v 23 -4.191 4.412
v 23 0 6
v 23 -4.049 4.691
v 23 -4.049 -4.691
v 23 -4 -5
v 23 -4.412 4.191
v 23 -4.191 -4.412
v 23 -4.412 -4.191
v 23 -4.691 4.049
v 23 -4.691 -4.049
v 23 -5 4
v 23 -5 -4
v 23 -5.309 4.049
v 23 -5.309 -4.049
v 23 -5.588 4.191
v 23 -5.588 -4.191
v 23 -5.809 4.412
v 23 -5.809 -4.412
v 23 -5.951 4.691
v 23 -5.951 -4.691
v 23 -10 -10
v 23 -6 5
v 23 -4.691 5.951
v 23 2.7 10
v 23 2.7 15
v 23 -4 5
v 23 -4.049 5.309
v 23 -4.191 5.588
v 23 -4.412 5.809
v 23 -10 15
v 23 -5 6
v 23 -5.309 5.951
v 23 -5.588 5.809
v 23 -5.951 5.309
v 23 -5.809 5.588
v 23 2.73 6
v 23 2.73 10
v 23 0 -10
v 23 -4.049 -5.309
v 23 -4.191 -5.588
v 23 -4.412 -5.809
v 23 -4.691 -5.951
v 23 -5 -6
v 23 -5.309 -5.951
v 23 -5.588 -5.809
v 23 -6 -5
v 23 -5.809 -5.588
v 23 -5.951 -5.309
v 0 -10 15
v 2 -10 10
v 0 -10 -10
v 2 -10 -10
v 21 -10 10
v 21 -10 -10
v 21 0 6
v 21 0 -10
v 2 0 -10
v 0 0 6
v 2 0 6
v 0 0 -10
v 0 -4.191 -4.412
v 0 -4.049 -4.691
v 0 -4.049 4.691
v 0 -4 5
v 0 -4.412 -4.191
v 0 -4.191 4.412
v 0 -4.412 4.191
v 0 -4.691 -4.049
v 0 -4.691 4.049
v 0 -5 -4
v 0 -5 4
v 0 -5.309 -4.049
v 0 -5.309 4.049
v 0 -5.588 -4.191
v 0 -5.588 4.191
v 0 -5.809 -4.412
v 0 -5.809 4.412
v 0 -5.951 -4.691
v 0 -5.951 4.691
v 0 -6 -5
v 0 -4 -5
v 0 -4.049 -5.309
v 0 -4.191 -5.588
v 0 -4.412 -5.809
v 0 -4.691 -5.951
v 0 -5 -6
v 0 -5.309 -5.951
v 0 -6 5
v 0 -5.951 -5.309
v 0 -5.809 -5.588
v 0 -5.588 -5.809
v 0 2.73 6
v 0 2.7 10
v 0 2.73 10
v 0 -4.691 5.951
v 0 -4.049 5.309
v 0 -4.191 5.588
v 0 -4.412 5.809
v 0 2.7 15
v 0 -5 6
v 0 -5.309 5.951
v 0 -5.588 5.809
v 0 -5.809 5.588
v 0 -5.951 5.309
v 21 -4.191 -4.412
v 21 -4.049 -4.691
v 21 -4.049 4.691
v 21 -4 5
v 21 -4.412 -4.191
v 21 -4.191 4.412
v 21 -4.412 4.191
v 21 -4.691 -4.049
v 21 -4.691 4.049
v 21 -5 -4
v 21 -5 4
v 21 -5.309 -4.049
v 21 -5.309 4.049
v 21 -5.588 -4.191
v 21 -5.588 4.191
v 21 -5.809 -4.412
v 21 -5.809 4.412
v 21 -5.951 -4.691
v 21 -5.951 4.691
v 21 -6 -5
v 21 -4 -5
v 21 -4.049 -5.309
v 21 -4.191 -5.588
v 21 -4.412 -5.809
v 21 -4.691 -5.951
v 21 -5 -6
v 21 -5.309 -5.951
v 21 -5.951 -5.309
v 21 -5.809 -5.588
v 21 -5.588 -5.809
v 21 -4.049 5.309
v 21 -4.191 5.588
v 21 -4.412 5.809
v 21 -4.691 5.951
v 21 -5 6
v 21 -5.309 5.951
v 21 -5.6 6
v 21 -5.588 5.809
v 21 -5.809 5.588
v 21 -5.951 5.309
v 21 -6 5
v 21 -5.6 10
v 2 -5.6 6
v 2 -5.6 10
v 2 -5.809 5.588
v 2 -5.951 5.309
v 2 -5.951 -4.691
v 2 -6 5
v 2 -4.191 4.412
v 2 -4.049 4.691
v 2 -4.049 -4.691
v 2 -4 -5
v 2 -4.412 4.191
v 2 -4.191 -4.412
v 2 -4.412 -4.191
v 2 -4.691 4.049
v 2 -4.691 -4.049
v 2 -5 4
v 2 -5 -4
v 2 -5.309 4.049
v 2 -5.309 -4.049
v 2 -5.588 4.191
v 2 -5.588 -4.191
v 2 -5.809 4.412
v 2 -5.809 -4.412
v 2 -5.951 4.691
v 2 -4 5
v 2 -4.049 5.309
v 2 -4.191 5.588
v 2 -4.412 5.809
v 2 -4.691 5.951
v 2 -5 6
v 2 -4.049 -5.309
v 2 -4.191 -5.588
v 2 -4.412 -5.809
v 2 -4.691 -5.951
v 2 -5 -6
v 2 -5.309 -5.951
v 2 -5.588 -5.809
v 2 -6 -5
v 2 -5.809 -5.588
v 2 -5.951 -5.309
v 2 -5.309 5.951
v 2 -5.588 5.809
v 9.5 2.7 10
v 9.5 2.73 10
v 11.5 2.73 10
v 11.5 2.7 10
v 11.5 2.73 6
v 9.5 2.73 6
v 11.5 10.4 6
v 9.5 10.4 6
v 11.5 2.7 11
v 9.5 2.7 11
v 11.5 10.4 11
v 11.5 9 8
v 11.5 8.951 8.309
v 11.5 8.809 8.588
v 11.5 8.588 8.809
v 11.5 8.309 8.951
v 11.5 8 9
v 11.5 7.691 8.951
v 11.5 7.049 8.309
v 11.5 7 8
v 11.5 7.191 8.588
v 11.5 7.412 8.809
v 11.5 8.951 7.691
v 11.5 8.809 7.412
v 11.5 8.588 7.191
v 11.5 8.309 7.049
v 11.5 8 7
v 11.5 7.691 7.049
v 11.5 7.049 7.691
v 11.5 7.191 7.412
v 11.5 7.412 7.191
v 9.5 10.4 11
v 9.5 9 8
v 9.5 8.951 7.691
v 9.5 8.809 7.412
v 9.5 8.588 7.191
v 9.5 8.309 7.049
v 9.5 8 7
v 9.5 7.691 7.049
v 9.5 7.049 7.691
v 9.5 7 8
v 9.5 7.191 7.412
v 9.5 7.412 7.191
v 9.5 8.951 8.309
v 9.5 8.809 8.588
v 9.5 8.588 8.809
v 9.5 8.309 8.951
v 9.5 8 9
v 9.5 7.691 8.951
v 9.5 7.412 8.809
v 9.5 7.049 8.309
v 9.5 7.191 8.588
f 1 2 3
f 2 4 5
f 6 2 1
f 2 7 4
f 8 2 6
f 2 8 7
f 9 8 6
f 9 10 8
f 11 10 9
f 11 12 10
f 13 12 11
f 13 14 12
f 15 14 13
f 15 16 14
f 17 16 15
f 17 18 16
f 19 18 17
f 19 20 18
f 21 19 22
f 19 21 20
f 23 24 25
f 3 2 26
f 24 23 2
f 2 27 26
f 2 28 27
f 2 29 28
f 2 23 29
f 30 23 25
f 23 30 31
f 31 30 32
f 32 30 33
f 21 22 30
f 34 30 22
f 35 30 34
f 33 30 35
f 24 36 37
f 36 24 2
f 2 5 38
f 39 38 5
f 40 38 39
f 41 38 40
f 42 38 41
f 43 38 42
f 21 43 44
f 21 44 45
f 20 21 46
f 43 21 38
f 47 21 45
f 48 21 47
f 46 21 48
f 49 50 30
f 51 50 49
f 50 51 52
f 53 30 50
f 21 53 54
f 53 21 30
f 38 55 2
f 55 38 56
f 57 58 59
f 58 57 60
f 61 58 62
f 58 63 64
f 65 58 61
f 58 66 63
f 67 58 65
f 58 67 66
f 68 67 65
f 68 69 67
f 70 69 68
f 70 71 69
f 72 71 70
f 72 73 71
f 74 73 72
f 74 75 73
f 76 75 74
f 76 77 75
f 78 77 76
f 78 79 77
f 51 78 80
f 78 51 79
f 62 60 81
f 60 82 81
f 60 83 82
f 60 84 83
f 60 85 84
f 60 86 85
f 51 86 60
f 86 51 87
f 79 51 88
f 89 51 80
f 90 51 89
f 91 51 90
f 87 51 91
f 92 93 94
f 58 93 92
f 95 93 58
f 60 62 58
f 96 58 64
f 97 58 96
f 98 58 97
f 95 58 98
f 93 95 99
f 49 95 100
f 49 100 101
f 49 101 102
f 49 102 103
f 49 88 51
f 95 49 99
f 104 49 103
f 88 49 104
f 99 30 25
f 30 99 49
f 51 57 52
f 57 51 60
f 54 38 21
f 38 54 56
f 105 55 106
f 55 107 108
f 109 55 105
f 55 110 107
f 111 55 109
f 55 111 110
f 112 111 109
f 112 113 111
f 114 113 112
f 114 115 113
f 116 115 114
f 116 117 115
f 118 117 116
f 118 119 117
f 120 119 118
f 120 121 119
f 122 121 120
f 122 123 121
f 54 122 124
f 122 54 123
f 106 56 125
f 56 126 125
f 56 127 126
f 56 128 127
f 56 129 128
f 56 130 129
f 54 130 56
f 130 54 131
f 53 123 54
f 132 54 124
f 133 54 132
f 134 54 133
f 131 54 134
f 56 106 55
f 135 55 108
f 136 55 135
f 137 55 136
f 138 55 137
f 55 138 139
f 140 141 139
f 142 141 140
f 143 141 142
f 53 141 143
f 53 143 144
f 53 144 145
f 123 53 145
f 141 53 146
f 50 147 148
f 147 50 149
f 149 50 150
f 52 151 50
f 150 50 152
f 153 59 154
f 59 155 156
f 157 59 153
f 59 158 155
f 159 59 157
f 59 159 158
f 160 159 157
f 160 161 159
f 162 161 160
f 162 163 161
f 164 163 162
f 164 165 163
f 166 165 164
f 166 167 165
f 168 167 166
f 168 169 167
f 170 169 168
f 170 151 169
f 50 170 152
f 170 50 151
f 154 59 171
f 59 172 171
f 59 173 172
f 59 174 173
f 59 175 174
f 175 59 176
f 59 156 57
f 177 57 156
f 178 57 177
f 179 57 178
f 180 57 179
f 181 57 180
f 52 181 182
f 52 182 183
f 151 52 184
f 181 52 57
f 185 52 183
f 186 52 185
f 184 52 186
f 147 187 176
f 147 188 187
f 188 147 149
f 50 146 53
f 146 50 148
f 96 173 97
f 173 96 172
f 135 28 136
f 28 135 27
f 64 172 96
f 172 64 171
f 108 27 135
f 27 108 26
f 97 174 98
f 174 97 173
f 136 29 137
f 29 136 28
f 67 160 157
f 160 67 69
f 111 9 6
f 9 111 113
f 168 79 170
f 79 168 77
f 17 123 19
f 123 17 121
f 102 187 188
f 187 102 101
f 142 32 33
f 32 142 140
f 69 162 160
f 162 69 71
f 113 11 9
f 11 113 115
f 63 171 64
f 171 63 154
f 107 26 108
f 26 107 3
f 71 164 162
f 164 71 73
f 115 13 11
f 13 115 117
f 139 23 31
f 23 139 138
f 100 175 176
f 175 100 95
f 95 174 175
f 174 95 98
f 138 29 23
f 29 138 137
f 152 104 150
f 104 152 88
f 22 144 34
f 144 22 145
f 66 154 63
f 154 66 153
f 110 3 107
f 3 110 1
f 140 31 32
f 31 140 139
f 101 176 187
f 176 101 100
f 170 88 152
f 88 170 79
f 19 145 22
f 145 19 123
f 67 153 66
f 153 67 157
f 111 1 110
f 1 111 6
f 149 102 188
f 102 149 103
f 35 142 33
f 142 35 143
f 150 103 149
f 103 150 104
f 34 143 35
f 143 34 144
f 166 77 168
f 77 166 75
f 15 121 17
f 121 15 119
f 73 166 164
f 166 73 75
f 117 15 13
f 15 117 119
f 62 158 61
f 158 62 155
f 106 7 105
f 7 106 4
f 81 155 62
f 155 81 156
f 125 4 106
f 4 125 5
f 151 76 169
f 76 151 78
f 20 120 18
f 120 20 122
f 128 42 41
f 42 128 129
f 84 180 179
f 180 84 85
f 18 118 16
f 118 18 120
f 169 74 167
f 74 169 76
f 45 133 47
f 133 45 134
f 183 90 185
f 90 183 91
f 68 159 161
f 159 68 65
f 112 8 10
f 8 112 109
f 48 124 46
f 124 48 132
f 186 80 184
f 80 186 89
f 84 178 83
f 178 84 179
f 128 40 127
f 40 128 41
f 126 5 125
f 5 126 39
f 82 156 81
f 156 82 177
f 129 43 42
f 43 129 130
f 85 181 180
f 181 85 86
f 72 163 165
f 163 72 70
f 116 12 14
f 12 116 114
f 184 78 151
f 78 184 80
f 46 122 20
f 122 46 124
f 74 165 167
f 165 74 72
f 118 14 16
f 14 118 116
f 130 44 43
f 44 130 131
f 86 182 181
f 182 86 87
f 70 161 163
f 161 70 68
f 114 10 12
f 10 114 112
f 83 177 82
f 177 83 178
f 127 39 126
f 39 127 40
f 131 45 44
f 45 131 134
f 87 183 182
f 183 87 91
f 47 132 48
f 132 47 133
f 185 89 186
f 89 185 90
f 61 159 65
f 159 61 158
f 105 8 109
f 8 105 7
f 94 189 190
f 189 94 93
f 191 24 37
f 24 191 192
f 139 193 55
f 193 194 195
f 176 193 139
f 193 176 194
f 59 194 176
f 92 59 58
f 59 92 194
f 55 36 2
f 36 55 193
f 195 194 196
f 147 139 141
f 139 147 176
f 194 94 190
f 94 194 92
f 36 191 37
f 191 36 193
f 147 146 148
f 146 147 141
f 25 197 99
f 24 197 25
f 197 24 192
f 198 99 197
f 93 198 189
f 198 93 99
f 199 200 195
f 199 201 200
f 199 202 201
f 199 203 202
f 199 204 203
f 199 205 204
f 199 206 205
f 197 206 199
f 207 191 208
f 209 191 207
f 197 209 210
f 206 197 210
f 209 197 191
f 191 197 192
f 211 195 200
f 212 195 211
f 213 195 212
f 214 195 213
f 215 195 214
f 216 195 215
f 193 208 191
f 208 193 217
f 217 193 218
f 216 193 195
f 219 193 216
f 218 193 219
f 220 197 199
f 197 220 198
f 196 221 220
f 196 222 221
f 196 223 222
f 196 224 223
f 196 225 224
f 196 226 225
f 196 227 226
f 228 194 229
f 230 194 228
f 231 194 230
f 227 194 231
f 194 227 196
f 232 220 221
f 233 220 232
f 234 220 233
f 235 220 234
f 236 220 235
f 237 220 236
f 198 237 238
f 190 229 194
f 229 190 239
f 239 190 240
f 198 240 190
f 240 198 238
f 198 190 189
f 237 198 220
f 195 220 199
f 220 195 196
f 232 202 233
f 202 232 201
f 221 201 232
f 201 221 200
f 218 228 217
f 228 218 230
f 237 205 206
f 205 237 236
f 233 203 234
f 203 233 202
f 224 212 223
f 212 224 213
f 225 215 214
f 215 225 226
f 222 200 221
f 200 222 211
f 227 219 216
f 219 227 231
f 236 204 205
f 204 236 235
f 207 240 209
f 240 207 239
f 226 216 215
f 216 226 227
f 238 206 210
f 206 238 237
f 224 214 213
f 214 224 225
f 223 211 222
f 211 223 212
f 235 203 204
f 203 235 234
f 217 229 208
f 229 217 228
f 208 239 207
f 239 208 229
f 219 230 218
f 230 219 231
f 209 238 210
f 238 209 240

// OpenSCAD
$fn=20;
difference(){
difference(){
translate([0,0,-10])rotate([90,0,0])difference(){
cube([23,25,10]);
translate([2,0,0])cube([19,20,11]);
}
translate([0,-5,5])rotate([90,0,90])cylinder(28,1,1);}

translate([0,-5,-5])rotate([90,0,90])cylinder(23,1,1);
}



difference(){
difference(){
translate([0,-5.6,6])
union(){
color("green")cube([23,8.33,4]);
translate([0,5.3,4])color("red")cube([23,3,5]);
    translate([9.5,8,0])color("green")color ("red")cube([2,8,5]);
}
translate([6,8,8])rotate([90,0,90])cylinder(6,1,1);
}
translate([0,-5, 5])rotate([90,0,90])cylinder(23,1,1);
}
